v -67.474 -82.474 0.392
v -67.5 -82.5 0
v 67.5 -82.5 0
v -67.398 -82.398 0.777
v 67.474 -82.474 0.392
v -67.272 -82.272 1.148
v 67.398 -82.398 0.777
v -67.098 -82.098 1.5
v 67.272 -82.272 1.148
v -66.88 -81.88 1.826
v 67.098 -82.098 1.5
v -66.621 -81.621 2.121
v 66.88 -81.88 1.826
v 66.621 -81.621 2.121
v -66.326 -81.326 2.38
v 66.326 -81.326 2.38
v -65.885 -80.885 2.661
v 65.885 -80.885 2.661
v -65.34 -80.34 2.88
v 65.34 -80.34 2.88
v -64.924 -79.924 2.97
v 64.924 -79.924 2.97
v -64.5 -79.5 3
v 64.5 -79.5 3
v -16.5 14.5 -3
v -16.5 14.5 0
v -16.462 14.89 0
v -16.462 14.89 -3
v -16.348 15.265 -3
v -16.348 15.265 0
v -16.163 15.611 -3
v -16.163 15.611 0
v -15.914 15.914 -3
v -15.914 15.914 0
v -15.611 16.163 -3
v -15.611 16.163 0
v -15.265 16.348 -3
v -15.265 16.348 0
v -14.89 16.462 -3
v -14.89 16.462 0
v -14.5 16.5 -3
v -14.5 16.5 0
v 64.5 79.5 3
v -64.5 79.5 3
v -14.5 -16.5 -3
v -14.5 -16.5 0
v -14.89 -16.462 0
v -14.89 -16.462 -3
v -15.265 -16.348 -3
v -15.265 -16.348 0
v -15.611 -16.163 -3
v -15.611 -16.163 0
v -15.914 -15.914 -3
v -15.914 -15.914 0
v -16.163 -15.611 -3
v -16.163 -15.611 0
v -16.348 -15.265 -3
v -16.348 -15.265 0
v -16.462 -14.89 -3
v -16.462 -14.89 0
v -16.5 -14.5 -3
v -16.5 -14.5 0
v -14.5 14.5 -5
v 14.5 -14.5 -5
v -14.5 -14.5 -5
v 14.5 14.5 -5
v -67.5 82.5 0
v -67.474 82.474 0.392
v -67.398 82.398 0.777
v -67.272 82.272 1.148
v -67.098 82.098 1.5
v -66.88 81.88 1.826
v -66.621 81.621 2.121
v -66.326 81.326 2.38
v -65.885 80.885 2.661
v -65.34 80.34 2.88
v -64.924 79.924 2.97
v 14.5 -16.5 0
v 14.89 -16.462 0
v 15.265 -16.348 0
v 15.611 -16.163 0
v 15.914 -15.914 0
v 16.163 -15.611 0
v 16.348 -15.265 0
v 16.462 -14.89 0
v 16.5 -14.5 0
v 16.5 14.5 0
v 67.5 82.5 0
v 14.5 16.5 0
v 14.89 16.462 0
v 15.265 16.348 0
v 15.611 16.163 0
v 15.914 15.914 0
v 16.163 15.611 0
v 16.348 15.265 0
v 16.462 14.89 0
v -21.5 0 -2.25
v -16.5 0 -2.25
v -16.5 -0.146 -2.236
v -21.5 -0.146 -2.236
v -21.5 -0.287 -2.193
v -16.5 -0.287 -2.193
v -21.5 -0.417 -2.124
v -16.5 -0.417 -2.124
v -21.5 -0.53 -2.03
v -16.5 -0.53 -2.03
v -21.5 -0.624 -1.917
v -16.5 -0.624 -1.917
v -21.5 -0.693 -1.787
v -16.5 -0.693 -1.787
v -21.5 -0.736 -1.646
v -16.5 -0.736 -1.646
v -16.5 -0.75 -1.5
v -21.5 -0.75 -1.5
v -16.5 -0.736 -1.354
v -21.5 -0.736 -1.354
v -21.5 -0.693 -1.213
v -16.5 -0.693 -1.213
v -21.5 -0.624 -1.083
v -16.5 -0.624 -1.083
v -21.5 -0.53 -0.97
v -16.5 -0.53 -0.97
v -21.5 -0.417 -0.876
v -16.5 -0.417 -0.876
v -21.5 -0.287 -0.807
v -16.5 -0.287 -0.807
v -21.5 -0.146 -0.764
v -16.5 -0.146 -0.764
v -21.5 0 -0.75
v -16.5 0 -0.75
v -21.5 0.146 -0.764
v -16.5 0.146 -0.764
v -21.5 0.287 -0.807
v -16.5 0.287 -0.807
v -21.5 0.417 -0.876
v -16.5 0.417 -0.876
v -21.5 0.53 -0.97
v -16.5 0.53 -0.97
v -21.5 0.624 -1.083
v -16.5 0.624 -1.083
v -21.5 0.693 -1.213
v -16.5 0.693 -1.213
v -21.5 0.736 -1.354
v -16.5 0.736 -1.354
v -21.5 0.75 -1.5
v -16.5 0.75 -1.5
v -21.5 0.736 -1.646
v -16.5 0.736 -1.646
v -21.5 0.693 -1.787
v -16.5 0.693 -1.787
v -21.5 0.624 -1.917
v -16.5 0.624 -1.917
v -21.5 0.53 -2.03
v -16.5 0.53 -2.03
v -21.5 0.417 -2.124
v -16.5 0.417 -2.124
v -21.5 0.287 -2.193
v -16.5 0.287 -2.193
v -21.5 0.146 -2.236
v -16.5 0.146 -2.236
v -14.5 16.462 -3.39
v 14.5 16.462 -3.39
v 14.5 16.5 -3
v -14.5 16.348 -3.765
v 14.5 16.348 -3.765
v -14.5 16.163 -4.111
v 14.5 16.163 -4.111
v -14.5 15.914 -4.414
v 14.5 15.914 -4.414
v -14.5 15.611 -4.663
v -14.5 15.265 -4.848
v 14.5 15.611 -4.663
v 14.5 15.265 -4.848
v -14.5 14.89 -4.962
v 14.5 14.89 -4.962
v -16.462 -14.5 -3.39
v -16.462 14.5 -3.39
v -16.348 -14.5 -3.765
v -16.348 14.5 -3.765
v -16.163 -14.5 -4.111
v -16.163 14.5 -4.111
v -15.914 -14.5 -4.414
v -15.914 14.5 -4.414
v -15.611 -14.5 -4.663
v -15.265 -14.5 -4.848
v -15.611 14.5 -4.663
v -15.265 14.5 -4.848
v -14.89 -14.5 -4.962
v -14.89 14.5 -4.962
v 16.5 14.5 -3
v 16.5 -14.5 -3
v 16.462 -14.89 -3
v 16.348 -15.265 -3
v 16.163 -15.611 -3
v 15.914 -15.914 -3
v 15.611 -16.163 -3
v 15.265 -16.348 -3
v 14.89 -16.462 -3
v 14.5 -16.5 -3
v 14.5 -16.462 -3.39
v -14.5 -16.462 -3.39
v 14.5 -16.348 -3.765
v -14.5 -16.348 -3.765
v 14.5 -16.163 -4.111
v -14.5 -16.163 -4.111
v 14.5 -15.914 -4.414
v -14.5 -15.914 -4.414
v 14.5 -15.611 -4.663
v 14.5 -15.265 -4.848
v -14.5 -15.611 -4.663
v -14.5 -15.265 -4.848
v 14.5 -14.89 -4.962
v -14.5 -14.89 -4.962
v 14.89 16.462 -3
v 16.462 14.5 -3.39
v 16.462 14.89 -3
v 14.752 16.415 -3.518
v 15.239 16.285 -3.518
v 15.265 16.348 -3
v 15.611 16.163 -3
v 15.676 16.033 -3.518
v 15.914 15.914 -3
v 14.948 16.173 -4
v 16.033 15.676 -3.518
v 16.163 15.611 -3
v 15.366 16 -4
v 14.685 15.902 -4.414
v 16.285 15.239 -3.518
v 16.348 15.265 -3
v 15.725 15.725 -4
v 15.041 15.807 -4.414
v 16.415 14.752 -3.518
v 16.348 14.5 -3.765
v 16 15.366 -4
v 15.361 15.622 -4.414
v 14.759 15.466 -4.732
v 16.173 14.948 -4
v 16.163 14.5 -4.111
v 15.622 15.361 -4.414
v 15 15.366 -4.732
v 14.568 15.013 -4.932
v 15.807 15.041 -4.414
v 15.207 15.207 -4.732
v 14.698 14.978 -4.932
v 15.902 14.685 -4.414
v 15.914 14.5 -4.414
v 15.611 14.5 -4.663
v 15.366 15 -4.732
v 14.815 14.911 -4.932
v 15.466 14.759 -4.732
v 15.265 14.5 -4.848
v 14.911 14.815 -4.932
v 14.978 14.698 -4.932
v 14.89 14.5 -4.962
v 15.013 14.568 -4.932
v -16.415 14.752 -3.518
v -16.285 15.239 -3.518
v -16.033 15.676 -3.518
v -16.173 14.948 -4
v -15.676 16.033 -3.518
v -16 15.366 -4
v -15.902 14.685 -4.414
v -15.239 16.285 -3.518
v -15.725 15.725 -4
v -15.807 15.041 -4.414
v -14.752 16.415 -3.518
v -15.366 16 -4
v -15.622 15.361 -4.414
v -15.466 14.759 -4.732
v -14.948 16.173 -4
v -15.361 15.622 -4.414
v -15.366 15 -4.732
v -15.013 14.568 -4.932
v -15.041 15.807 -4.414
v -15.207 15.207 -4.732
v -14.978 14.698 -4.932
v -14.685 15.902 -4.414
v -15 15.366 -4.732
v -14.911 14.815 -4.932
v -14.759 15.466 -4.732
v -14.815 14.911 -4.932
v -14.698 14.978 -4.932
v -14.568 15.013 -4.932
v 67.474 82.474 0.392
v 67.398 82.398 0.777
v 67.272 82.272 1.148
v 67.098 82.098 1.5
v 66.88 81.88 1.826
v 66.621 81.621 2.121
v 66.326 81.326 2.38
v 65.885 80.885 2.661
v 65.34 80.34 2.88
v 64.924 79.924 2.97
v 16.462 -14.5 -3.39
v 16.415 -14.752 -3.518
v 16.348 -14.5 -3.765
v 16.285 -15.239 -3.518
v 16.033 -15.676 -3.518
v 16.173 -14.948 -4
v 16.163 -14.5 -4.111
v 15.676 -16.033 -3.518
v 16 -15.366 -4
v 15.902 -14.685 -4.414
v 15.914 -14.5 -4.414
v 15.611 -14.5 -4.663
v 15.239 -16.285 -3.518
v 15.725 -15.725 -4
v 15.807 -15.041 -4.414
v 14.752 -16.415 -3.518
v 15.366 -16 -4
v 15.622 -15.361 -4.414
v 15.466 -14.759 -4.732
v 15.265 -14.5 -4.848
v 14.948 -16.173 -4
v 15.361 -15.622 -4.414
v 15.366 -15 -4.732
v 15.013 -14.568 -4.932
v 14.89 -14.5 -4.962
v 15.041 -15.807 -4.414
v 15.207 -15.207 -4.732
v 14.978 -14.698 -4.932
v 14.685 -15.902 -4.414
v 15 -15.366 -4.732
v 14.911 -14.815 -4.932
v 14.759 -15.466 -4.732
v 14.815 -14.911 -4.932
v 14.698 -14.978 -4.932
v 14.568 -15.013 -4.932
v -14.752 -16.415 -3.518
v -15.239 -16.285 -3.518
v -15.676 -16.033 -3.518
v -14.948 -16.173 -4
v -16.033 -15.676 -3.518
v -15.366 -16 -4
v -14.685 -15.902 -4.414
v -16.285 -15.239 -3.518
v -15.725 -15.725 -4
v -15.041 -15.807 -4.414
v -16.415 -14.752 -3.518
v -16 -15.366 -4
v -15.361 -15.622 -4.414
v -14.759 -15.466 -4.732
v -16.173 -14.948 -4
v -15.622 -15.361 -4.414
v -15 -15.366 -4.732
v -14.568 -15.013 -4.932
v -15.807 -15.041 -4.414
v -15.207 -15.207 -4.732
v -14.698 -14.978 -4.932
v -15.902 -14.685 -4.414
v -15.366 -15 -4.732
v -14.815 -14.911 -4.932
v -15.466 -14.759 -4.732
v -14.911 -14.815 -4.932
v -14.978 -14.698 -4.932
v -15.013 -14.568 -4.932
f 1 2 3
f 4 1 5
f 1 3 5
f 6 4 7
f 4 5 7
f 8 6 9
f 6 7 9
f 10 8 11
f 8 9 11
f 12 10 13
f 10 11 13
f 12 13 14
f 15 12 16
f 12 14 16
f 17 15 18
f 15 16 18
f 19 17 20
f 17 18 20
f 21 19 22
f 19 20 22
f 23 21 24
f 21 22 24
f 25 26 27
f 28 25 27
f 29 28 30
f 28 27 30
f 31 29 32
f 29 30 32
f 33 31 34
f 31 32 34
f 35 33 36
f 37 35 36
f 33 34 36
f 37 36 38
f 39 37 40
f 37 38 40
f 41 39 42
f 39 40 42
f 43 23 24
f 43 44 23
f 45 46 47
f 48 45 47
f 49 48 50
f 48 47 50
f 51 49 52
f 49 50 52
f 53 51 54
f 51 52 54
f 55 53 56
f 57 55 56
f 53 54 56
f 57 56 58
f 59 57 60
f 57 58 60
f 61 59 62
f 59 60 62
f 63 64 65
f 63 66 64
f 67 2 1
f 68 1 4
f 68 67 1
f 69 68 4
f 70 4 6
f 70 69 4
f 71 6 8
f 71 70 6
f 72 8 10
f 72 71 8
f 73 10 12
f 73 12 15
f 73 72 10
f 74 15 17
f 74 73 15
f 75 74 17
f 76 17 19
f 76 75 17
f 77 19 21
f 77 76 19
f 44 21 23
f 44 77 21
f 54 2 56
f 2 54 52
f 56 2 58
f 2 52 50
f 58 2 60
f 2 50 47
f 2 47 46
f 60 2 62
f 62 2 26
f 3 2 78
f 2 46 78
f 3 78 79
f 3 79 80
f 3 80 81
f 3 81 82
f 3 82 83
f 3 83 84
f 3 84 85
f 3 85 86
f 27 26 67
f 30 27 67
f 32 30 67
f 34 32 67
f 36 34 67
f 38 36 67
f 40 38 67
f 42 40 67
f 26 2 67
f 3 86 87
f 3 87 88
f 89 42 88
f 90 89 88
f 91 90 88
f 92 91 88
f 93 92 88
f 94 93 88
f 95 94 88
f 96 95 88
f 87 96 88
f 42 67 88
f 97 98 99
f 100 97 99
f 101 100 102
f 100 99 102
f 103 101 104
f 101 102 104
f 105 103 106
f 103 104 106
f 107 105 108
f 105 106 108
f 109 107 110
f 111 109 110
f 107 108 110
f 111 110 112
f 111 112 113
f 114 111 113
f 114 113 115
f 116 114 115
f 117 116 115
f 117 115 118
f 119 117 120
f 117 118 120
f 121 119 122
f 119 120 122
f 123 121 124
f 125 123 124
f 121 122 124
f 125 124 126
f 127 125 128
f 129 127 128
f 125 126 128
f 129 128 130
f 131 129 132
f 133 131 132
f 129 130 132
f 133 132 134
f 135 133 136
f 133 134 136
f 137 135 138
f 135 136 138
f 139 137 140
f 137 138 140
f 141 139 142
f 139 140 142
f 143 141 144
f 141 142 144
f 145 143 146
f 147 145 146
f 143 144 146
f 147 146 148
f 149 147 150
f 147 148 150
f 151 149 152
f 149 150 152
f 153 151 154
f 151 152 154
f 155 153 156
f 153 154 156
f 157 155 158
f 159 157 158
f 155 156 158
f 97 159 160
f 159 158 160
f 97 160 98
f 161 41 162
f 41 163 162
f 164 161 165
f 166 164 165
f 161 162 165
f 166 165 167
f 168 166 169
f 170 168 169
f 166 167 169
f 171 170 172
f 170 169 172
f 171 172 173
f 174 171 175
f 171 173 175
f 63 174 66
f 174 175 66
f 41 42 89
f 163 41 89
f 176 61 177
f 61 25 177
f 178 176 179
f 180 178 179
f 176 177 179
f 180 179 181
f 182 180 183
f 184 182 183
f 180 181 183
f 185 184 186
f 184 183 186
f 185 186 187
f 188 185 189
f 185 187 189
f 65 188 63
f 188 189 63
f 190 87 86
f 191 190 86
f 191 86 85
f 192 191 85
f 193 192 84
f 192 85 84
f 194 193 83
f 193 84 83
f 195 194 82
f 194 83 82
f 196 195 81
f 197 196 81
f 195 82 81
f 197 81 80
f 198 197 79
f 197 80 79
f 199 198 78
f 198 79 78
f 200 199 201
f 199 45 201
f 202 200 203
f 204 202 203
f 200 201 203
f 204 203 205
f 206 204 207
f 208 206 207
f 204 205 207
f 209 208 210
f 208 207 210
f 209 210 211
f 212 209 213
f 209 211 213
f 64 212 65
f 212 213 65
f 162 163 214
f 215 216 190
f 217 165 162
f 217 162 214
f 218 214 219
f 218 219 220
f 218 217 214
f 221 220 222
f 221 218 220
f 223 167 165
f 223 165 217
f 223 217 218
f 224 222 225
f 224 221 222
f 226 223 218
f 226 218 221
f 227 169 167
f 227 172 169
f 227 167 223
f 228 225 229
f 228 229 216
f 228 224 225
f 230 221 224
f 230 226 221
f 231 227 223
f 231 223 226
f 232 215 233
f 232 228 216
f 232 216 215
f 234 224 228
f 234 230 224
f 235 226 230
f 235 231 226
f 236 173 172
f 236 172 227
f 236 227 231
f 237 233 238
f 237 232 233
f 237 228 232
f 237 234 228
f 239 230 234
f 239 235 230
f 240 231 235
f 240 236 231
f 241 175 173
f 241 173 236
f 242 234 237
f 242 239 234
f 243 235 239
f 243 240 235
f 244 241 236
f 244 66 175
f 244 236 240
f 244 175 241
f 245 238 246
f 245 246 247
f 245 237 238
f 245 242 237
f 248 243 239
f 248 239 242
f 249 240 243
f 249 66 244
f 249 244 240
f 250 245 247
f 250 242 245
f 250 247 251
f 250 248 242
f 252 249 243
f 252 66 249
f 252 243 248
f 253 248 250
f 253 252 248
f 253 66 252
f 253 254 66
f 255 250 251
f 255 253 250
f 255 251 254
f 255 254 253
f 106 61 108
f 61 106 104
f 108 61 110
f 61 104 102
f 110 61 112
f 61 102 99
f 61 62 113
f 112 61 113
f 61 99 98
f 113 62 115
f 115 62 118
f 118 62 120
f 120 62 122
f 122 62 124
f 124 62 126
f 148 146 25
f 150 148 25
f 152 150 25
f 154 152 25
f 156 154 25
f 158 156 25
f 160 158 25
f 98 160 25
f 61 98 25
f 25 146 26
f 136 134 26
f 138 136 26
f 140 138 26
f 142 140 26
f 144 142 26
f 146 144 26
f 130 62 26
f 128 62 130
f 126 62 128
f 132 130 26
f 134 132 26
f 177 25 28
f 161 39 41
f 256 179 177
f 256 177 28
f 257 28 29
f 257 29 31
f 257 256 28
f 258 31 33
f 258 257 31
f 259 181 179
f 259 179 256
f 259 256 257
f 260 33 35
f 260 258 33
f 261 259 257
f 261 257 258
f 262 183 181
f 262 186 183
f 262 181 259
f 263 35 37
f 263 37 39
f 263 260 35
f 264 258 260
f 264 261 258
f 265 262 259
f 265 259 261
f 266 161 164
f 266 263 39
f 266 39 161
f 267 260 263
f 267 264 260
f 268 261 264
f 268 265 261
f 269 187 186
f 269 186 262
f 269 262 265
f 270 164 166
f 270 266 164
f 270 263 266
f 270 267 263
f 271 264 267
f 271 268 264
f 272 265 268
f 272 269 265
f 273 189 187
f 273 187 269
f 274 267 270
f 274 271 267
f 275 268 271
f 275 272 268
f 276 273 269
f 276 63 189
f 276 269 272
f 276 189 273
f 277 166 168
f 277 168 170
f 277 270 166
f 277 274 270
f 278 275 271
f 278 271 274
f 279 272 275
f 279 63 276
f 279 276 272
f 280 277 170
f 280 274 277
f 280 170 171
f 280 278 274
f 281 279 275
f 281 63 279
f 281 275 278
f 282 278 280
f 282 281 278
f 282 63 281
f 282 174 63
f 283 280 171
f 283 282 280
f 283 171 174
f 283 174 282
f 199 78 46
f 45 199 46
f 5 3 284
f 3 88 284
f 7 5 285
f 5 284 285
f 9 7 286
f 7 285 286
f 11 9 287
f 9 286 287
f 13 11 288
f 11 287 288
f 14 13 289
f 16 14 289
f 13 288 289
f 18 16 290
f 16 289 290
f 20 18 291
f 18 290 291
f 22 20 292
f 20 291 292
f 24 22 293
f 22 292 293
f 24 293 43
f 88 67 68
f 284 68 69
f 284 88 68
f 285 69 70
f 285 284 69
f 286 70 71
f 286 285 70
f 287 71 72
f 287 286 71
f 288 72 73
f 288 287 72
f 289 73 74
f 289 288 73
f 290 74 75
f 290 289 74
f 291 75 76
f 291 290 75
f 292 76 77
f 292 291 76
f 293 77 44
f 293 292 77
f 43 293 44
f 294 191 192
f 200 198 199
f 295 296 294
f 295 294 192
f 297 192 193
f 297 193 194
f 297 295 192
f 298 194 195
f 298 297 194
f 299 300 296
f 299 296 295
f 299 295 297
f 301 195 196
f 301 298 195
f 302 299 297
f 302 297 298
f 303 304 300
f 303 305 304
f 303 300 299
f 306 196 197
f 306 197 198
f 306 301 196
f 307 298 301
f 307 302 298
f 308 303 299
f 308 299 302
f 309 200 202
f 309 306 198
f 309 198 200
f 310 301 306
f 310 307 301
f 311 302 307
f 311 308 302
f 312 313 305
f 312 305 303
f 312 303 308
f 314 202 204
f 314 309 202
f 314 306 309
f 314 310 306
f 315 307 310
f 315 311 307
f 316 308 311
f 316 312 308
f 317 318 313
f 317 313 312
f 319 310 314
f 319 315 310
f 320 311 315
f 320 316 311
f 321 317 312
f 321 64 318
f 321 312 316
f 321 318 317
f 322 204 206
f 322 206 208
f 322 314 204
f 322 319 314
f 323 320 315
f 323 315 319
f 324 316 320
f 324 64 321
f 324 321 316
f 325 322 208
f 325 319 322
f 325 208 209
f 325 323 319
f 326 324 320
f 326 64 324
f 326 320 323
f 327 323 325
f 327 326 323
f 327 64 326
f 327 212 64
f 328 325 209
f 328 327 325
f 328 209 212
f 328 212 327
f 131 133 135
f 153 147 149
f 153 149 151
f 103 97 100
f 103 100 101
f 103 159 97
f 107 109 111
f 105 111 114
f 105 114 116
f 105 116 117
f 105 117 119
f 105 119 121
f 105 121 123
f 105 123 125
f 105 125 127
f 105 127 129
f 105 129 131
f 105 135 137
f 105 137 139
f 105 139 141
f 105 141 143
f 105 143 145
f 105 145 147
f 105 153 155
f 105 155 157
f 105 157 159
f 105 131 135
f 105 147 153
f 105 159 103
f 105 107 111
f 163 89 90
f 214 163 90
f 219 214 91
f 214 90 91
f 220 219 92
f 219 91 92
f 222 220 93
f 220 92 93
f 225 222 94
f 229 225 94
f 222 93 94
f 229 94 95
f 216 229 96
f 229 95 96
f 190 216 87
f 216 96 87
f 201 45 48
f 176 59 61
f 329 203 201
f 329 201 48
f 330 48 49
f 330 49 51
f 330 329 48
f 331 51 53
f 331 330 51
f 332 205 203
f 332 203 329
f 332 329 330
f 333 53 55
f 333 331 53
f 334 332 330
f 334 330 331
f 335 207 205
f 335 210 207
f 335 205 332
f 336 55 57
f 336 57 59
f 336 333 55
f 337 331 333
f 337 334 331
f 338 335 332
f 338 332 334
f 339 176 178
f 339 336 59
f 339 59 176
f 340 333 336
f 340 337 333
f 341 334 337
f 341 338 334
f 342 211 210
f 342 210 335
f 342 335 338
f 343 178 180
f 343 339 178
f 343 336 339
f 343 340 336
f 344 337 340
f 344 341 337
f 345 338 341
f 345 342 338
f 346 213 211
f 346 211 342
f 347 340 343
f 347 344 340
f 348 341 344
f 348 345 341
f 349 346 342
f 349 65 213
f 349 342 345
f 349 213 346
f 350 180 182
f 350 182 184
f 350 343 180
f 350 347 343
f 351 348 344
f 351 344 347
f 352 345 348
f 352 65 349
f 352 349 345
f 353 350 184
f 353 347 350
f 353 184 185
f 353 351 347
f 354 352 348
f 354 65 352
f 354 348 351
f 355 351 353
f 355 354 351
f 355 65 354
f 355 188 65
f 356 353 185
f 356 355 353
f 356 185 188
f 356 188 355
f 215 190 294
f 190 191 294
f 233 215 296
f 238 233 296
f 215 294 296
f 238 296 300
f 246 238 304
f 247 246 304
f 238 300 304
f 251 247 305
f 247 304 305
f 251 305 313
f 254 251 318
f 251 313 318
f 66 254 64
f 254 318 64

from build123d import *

# Parameters (mm, degrees)
ESQUISSE1_W        = 135
ESQUISSE1_H        = 165
BOSS_EXTRU_1_DEPTH = 3
CONG_1_R           = 3
BOSS_EXTRU_2_DEPTH = 5
CONG_2_R           = 2
ESQUISSE3_R        = 0.75
BOSS_EXTRU_3_DEPTH = 5


with BuildPart() as part:
    # Esquisse1 → Boss.-Extru.1 (new body)
    with BuildSketch(Plane.XY):
        Rectangle(ESQUISSE1_W, ESQUISSE1_H)
    extrude(amount=BOSS_EXTRU_1_DEPTH)

    # Congé1
    cong_1_edges = [part.edges().sort_by_distance(p)[0] for p in [
        (0, -82.5, 3),
        (0, 82.5, 3),
        (67.5, 0, 3),
        (-67.5, 0, 3),
    ]]
    fillet(cong_1_edges, radius=CONG_1_R - 0.0001)  # a hair under: the kernel refuses the full size

    # Esquisse2 → Boss.-Extru.2 (add)
    with BuildSketch(Plane(origin=(0, 0, 0), x_dir=(-1, 0, 0), z_dir=(0, 0, -1))):
        with BuildLine():
            Line((-14.5, -16.5), (14.5, -16.5))
            ThreePointArc((14.5, -16.5), (15.914213562, -15.914213562), (16.5, -14.5))
            Line((16.5, -14.5), (16.5, 14.5))
            ThreePointArc((16.5, 14.5), (15.914213562, 15.914213562), (14.5, 16.5))
            Line((14.5, 16.5), (-14.5, 16.5))
            ThreePointArc((-14.5, 16.5), (-15.914213562, 15.914213562), (-16.5, 14.5))
            Line((-16.5, 14.5), (-16.5, -14.5))
            ThreePointArc((-16.5, -14.5), (-15.914213562, -15.914213562), (-14.5, -16.5))
        make_face()
    extrude(amount=BOSS_EXTRU_2_DEPTH)

    # Congé2
    cong_2_edges = [part.edges().sort_by_distance(p)[0] for p in [
        (15.914213562, -15.914213562, -5),
        (0, -16.5, -5),
        (-15.914213562, -15.914213562, -5),
        (-16.5, 0, -5),
        (-15.914213562, 15.914213562, -5),
        (0, 16.5, -5),
        (15.914213562, 15.914213562, -5),
        (16.5, 0, -5),
    ]]
    fillet(cong_2_edges, radius=CONG_2_R)

    # Esquisse3 → Boss.-Extru.3 (add)
    with BuildSketch(Plane.ZY.offset(16.5)):
        with Locations(Location((-1.5, 0, 0), (0, 0, 180))):
            Circle(ESQUISSE3_R)
    extrude(amount=BOSS_EXTRU_3_DEPTH)


solid = part.part
